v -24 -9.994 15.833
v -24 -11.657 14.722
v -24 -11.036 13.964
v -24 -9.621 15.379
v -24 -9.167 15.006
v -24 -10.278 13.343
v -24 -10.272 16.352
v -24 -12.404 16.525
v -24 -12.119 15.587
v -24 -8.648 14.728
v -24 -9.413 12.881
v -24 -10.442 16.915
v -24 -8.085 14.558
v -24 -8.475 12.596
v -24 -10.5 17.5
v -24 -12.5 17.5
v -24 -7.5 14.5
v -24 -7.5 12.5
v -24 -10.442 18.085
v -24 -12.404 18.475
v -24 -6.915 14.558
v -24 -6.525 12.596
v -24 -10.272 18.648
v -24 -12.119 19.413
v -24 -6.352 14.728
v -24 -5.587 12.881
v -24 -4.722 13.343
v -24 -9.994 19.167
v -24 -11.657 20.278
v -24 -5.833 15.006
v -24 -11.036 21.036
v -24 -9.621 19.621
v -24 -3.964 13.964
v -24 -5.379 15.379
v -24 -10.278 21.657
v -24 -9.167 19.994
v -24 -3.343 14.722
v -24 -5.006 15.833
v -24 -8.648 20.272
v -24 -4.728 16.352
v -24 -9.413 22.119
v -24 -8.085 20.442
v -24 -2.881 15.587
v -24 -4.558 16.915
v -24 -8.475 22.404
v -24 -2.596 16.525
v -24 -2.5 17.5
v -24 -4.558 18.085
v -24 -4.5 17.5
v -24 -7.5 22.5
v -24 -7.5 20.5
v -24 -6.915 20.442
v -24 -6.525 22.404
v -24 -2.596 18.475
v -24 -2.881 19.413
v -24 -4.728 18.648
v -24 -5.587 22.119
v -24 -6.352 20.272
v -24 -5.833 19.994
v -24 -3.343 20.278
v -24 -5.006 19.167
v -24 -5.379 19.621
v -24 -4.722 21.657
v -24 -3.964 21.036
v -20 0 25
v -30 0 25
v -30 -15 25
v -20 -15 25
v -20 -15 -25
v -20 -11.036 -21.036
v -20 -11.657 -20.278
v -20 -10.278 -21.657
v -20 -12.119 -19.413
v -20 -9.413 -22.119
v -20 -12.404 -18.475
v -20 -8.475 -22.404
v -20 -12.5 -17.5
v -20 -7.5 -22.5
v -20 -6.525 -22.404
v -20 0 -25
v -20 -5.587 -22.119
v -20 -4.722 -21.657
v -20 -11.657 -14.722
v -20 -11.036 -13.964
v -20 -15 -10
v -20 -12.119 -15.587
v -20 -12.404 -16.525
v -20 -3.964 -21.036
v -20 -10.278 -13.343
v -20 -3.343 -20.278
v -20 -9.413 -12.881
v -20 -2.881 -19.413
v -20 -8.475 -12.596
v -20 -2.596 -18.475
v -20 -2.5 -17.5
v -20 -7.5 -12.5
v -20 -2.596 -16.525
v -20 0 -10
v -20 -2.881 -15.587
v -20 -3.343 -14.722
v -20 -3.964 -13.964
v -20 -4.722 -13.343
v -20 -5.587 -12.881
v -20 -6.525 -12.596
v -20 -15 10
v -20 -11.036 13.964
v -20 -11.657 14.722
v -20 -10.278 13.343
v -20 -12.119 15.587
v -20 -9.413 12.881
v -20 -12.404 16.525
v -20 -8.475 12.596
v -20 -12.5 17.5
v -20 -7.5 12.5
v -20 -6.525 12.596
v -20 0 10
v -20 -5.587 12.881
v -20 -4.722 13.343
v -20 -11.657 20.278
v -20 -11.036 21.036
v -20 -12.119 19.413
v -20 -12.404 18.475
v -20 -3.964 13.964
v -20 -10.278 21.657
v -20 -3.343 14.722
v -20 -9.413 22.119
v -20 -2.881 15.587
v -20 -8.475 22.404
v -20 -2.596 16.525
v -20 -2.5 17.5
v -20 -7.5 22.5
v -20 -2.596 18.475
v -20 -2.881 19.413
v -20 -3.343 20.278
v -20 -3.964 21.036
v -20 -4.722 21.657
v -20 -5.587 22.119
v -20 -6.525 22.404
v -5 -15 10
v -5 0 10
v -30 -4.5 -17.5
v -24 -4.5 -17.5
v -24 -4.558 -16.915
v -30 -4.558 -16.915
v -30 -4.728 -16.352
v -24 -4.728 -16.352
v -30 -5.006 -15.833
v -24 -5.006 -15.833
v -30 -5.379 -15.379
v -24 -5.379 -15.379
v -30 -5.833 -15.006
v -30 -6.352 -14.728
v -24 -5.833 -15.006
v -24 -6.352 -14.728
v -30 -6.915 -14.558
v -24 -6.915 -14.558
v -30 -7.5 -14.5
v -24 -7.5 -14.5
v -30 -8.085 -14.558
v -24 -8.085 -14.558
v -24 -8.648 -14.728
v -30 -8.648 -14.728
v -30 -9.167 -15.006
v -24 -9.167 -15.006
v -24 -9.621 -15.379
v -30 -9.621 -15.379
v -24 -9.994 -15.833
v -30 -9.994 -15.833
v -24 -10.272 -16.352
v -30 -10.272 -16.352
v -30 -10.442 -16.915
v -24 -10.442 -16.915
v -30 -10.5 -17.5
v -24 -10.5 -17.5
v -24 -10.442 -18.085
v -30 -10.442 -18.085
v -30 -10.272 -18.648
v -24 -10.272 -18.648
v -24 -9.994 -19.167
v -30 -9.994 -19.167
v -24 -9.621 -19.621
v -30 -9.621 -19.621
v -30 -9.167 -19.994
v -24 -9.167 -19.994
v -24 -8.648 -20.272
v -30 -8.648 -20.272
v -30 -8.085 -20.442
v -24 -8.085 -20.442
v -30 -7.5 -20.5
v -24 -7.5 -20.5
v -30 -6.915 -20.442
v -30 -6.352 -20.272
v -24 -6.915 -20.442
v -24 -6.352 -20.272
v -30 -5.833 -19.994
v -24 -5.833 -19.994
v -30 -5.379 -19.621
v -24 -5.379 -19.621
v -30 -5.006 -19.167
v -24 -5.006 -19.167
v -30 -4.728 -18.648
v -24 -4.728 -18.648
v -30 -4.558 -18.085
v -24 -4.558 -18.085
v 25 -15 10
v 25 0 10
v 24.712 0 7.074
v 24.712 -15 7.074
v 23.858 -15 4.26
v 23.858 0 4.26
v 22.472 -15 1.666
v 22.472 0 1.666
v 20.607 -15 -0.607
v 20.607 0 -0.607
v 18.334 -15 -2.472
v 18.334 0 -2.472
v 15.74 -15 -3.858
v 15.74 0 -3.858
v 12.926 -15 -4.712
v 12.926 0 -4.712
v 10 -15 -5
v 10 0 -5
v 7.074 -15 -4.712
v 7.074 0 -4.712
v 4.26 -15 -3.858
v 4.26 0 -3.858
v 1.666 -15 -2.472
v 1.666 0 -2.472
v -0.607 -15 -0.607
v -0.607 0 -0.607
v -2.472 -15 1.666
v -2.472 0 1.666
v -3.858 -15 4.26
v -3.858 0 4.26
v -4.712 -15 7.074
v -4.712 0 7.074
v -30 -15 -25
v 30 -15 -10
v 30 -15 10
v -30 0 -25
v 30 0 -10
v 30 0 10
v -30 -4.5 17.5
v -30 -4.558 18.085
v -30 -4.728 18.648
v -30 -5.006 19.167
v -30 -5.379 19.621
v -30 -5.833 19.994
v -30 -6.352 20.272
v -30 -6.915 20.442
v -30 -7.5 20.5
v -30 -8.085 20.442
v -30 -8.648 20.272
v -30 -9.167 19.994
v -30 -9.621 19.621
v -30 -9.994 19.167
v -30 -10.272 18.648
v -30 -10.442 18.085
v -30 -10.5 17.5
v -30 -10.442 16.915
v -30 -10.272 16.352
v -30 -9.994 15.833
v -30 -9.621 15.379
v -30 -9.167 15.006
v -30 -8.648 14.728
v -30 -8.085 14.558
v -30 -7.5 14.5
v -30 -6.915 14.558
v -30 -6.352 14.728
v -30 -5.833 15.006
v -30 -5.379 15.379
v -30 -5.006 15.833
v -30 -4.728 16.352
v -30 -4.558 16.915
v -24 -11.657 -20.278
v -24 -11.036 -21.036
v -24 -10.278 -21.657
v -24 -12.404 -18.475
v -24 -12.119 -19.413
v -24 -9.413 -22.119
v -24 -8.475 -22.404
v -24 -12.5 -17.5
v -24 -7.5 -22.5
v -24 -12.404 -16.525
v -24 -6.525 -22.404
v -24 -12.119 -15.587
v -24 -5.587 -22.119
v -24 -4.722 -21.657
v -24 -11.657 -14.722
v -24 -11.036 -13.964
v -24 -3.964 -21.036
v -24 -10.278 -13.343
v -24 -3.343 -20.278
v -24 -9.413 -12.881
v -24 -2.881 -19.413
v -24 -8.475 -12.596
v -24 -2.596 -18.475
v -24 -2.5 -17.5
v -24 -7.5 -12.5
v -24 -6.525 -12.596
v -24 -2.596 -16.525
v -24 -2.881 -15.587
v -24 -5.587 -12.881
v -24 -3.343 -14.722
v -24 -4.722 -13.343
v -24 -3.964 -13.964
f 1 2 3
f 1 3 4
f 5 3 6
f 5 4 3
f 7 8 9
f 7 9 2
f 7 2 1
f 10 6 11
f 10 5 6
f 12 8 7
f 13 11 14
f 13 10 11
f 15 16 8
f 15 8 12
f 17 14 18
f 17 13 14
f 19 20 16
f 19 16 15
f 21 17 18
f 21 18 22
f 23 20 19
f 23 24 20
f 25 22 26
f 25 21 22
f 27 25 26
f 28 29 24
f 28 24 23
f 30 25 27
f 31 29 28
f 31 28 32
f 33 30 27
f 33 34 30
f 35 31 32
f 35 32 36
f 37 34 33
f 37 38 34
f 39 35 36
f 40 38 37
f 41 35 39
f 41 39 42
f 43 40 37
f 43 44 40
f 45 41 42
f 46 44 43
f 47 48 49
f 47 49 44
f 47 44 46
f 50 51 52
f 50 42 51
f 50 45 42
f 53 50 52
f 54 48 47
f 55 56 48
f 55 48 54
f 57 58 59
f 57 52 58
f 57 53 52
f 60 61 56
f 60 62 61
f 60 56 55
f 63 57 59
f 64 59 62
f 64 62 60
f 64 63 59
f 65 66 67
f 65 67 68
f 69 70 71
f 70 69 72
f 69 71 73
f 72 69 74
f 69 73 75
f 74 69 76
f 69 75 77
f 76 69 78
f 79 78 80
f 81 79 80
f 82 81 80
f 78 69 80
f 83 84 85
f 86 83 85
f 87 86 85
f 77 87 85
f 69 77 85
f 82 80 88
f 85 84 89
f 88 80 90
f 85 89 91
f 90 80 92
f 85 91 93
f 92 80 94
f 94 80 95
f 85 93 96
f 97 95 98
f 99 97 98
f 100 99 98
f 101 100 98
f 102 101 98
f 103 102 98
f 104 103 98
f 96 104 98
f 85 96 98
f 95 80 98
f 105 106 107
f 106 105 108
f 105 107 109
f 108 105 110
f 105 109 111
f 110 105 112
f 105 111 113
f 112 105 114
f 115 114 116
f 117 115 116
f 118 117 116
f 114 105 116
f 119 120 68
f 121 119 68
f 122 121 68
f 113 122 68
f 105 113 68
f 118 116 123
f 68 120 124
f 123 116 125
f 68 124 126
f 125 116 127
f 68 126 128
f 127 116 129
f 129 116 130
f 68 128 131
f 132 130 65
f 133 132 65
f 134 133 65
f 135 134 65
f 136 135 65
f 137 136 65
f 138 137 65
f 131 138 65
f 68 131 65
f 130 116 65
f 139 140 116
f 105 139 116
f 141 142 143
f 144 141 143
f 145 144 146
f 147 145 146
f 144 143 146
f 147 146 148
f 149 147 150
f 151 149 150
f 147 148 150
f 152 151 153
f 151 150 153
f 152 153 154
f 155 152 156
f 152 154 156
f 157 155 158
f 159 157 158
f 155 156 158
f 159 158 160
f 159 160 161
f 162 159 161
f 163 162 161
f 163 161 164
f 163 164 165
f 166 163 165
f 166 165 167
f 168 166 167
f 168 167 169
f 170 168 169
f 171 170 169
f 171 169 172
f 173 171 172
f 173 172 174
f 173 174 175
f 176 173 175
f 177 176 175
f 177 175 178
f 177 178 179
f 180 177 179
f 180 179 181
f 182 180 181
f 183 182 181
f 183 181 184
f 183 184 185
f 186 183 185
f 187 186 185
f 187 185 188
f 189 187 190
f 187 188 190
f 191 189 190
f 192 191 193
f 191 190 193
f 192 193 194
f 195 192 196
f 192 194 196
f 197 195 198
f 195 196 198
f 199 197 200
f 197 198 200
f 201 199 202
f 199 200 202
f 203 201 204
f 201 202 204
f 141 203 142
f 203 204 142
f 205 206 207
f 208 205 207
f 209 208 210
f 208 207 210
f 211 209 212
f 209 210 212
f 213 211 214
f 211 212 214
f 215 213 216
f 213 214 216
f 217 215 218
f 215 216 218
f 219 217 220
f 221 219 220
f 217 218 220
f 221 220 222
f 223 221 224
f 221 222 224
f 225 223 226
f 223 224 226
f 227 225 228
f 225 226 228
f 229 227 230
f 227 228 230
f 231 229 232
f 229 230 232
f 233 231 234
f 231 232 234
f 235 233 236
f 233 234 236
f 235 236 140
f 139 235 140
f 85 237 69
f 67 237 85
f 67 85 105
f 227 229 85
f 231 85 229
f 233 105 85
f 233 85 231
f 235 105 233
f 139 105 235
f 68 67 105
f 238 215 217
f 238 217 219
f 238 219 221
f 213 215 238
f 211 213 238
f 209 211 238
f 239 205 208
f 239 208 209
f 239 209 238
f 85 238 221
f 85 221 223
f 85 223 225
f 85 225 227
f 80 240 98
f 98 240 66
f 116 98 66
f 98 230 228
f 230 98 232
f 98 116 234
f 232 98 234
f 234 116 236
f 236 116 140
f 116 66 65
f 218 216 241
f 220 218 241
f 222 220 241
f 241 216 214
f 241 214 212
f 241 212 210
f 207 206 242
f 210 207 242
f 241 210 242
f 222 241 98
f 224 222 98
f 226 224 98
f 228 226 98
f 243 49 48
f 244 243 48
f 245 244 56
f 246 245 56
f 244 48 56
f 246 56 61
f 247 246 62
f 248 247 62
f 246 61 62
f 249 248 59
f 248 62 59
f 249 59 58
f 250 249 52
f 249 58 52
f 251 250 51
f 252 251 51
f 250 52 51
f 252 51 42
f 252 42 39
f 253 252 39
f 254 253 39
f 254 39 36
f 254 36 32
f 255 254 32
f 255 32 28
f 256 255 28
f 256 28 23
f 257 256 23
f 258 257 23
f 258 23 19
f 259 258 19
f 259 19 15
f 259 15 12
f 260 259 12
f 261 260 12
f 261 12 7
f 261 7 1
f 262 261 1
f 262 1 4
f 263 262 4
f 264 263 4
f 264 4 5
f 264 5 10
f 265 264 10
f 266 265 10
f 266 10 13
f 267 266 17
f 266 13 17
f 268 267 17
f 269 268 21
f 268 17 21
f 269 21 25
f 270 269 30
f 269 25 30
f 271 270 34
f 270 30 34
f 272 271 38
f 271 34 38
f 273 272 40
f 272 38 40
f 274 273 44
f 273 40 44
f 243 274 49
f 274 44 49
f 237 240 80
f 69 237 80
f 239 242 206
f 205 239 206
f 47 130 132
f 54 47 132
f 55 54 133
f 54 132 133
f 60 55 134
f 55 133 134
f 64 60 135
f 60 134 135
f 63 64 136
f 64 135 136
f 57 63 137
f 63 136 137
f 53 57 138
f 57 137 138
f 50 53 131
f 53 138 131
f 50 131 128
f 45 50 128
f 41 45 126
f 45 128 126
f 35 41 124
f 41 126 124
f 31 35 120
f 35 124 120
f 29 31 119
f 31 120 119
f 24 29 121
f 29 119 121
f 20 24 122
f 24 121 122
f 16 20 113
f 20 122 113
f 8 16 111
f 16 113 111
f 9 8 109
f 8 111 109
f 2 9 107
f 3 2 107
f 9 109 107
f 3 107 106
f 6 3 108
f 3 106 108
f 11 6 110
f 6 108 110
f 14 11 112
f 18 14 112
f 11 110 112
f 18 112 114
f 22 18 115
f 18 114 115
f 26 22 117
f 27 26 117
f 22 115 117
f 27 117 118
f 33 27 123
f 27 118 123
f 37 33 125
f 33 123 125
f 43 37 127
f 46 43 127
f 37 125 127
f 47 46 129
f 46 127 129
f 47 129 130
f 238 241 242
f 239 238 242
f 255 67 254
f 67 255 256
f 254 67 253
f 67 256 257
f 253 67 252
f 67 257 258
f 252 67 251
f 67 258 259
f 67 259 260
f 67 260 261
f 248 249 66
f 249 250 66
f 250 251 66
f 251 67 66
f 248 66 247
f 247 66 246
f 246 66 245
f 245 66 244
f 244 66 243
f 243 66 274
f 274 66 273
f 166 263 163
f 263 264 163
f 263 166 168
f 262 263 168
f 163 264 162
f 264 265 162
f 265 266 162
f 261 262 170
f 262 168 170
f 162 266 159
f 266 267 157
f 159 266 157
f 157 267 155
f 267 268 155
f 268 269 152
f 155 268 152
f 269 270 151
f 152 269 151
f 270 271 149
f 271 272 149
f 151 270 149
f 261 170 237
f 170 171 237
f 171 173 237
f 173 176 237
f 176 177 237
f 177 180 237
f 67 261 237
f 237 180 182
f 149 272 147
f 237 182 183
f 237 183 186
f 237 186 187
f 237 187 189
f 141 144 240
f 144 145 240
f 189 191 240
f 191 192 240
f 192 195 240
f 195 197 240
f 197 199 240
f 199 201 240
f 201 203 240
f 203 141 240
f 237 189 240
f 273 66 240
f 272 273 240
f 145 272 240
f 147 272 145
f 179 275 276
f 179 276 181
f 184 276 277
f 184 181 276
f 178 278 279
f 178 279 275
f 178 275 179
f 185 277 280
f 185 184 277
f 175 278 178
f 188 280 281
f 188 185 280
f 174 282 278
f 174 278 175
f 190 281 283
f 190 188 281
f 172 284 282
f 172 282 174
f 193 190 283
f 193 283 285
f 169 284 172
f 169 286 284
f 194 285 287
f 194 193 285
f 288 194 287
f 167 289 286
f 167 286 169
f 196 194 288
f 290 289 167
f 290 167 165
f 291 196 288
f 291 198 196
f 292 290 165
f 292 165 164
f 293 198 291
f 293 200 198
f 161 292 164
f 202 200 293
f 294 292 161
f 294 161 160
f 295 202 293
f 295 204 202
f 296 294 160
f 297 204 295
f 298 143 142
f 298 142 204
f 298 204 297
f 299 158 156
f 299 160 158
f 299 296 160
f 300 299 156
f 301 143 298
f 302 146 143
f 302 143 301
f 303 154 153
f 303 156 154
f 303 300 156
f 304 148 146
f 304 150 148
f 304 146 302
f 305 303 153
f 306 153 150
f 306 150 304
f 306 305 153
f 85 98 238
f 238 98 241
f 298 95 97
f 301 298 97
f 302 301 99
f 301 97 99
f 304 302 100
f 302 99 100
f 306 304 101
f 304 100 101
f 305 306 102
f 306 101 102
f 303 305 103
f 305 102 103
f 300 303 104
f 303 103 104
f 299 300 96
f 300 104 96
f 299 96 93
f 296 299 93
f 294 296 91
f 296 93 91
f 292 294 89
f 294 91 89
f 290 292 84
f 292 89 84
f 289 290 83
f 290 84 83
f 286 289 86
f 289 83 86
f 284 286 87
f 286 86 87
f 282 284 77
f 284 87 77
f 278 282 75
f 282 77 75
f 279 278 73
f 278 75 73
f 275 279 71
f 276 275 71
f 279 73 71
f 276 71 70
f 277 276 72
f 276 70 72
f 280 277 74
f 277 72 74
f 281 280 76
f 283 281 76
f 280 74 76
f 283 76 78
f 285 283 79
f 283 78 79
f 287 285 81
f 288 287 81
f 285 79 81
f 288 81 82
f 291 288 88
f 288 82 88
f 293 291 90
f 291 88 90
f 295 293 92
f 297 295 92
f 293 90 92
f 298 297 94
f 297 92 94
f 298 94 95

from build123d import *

# Parameters (mm, degrees)
F0_W     = 10
F0_H     = 15
F0_H_2   = 20
F1_DEPTH = 15
F2_R     = 3
F3_DEPTH = 10.001
F4_R     = 5
F4_R_2   = 3
F5_DEPTH = 4
F6_R     = 3
F7_DEPTH = 10.001
F8_R     = 5
F8_R_2   = 3
F9_DEPTH = 4


with BuildPart() as f1:
    # F0 (on Front) → F1 (new body)
    with BuildSketch(Plane.XZ):
        with Locations((-25, 17.5)):
            Rectangle(F0_W, F0_H)
        with Locations((-25, 0)):
            Rectangle(F0_W, F0_H_2)
        with BuildLine():
            Line((-20, -10), (30, -10))
            Line((30, -10), (30, 10))
            Line((30, 10), (25, 10))
            ThreePointArc((25, 10), (10, -5), (-5, 10))
            Line((-5, 10), (-20, 10))
            Line((-20, 10), (-20, -10))
        make_face()
        with Locations((-25, -17.5)):
            Rectangle(F0_W, F0_H)
    extrude(amount=F1_DEPTH)

    # F2 (on face) → F3 (cut, through all)
    with BuildSketch(Plane.YZ.offset(-20)):
        with Locations((-7.5, 17.5)):
            Circle(F2_R)
    extrude(amount=-F3_DEPTH, mode=Mode.SUBTRACT)

    # F4 (on face) → F5 (cut)
    with BuildSketch(Plane.YZ.offset(-20)):
        with Locations((-7.5, 17.5)):
            Circle(F4_R)
        with Locations((-7.5, 17.5)):
            Circle(F4_R_2, mode=Mode.SUBTRACT)
    extrude(amount=-F5_DEPTH, mode=Mode.SUBTRACT)

    # F6 (on face) → F7 (cut, through all)
    with BuildSketch(Plane.YZ.offset(-20)):
        with Locations((-7.5, -17.5)):
            Circle(F6_R)
    extrude(amount=-F7_DEPTH, mode=Mode.SUBTRACT)

    # F8 (on face) → F9 (cut)
    with BuildSketch(Plane.YZ.offset(-20)):
        with Locations((-7.5, -17.5)):
            Circle(F8_R)
        with Locations((-7.5, -17.5)):
            Circle(F8_R_2, mode=Mode.SUBTRACT)
    extrude(amount=-F9_DEPTH, mode=Mode.SUBTRACT)


solid = f1.part
